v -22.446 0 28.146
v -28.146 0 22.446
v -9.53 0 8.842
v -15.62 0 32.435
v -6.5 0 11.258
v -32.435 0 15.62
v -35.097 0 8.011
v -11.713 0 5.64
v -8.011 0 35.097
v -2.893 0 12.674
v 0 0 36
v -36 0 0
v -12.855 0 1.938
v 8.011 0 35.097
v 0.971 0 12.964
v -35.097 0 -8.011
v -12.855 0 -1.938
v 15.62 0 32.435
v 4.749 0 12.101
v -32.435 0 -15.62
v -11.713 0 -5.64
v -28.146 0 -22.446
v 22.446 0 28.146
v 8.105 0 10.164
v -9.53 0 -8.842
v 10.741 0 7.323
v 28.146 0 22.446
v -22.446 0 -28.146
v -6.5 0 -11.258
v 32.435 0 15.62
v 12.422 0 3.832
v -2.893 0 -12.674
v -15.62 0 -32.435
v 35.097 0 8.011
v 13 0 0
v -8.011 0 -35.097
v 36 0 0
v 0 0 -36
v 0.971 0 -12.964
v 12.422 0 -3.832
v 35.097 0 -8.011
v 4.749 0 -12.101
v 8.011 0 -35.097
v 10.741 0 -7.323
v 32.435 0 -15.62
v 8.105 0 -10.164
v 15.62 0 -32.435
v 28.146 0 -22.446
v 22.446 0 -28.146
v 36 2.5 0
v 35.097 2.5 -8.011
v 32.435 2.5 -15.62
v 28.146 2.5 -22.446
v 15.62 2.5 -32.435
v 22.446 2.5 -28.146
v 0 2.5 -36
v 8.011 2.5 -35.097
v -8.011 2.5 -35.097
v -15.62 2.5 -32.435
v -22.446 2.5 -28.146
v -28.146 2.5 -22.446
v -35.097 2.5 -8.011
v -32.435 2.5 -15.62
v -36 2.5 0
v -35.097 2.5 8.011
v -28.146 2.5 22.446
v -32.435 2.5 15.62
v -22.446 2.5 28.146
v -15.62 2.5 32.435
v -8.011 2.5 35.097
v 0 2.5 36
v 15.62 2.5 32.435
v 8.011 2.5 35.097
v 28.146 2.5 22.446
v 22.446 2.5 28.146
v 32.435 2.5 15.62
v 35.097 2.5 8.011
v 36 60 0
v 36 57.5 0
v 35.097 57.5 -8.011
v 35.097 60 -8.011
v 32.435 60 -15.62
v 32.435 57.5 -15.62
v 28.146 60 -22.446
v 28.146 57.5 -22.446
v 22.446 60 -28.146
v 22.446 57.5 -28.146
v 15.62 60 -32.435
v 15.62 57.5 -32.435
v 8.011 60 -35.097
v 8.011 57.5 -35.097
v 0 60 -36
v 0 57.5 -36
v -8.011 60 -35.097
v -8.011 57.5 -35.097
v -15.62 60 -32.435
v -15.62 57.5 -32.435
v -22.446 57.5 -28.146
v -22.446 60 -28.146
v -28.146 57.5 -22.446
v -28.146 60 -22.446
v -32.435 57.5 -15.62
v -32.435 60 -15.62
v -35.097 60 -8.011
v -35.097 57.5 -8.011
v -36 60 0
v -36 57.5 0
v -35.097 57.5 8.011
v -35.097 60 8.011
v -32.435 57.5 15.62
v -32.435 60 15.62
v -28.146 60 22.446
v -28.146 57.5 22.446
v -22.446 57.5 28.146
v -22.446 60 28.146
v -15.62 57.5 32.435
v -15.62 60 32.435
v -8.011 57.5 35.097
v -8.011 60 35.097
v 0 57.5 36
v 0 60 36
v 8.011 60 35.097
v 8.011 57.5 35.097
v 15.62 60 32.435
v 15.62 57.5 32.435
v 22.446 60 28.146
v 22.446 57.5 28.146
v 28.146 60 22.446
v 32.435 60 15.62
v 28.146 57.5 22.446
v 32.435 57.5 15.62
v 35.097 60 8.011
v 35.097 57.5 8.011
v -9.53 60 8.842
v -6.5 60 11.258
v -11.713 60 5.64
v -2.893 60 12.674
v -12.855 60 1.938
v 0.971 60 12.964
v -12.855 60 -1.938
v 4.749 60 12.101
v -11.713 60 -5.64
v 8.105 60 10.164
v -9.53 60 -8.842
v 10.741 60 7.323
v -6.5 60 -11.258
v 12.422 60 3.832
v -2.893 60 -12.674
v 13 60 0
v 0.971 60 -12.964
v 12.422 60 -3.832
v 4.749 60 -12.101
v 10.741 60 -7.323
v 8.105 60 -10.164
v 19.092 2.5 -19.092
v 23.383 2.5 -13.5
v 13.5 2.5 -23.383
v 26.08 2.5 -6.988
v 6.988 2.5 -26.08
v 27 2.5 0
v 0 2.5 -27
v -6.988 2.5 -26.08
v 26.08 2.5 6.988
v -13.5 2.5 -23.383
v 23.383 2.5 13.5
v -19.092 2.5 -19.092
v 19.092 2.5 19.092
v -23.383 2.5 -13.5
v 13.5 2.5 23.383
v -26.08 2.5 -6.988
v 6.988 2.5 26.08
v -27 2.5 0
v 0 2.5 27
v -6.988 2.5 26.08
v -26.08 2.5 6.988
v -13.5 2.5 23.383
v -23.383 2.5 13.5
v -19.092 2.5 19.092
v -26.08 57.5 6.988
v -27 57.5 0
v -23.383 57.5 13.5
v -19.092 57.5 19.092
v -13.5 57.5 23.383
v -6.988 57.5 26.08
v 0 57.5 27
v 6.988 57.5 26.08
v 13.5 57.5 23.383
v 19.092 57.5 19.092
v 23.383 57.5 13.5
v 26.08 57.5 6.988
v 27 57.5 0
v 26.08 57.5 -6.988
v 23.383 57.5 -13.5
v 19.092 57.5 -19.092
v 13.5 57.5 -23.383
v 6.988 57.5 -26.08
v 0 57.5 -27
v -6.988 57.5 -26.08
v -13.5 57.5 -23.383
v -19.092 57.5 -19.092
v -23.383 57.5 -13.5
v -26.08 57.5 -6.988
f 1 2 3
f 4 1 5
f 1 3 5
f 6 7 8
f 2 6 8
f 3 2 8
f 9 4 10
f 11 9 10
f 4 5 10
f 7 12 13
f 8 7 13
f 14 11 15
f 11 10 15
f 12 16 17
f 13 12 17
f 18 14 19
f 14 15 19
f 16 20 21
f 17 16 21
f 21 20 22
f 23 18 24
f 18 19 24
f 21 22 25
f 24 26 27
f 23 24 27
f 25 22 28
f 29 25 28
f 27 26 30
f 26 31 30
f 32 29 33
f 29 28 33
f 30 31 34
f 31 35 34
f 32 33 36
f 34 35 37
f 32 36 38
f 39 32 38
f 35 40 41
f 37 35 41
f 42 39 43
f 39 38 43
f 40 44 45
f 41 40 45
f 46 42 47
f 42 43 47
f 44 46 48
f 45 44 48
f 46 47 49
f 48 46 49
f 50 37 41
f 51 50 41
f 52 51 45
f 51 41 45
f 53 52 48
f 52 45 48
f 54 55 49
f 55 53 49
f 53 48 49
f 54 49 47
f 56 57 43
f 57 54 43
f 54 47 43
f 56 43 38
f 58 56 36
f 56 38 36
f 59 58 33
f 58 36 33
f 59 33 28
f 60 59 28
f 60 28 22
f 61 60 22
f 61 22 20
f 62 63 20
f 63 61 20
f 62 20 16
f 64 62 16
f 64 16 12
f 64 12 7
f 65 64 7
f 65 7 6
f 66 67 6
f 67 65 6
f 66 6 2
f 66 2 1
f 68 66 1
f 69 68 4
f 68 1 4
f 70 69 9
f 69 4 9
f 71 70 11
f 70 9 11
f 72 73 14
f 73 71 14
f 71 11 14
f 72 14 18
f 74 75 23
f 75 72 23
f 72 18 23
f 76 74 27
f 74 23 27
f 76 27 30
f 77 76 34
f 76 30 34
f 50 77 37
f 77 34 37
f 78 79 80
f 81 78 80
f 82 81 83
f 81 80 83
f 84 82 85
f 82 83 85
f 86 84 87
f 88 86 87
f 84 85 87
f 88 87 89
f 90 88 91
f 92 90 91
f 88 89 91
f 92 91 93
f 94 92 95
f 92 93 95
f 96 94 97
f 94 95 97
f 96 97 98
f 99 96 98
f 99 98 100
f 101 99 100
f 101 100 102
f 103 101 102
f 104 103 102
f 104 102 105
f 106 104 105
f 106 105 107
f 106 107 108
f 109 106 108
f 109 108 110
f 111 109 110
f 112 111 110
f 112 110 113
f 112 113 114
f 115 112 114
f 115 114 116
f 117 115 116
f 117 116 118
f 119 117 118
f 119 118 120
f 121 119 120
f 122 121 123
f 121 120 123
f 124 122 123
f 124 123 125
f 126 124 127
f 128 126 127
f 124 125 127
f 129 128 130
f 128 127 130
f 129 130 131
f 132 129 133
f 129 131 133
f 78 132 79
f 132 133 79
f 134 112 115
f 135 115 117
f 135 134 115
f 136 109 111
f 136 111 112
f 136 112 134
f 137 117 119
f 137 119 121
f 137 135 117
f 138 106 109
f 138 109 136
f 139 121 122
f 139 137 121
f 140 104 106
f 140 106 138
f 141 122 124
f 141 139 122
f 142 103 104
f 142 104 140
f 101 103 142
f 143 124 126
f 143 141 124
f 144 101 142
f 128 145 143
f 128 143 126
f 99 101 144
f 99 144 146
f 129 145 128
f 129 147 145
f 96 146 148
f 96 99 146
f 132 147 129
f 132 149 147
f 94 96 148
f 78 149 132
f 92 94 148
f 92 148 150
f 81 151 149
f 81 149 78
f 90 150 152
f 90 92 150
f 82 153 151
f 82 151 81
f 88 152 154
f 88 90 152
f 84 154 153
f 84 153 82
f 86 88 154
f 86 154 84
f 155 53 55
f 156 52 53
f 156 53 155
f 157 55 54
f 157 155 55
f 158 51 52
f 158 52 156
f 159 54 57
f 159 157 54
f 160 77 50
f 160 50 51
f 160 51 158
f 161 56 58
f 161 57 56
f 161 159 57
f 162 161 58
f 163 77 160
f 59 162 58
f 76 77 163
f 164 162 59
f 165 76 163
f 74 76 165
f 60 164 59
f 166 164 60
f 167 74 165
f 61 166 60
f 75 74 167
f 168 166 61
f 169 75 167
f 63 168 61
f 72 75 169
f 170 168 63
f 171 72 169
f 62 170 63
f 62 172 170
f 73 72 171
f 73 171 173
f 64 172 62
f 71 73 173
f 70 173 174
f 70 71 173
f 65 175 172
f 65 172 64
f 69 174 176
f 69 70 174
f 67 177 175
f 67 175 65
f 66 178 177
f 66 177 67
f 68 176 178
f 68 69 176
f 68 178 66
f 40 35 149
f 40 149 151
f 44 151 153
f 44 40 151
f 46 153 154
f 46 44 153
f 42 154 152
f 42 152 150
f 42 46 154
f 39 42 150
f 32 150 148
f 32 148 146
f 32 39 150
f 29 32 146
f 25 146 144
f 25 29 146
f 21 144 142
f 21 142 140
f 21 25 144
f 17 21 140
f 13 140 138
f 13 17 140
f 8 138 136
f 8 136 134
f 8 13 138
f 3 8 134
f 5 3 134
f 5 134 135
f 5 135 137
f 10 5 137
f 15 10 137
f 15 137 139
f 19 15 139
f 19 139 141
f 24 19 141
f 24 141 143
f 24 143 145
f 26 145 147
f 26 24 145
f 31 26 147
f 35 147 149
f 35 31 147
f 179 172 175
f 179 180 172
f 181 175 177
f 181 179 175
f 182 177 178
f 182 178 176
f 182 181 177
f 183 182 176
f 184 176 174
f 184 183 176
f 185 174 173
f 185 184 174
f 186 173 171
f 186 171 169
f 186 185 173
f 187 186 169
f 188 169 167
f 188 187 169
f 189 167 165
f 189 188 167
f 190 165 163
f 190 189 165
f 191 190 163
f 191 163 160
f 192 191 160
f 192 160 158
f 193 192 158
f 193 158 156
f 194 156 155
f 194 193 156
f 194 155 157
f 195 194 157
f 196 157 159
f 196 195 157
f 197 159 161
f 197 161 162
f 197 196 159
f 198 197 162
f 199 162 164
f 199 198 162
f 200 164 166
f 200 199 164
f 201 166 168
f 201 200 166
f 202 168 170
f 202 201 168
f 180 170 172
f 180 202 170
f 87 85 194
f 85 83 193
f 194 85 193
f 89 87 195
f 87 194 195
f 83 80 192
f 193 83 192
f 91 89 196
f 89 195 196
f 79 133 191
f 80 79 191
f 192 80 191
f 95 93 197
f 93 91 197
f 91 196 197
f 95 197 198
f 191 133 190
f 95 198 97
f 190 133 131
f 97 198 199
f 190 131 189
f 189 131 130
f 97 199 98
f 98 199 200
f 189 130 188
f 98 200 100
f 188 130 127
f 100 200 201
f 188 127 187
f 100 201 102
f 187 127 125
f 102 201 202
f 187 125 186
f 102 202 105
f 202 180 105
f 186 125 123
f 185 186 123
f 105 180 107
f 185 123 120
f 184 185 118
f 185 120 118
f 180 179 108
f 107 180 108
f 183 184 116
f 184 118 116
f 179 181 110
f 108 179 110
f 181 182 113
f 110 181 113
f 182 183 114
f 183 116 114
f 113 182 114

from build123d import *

# Parameters (mm, degrees)
SKETCH1_R           = 36
SKETCH1_R_2         = 13
BOSS_EXTRUDE1_DEPTH = 60
SKETCH2_W           = 9
SKETCH2_H           = 55


with BuildPart() as part:
    # Sketch1 → Boss-Extrude1 (new body)
    with BuildSketch(Plane(origin=(0, 0, 0), x_dir=(1, 0, 0), z_dir=(0, 1, 0))):
        Circle(SKETCH1_R)
        Circle(SKETCH1_R_2, mode=Mode.SUBTRACT)
    extrude(amount=BOSS_EXTRUDE1_DEPTH)

    # Sketch2 → Cut-Revolve1 (revolve, cut)
    with BuildSketch(Plane.XY):
        with Locations((-31.5, 30)):
            Rectangle(SKETCH2_W, SKETCH2_H)
    revolve(axis=Axis((0, 0, 0), (0, 1, 0)), mode=Mode.SUBTRACT)


solid = part.part
